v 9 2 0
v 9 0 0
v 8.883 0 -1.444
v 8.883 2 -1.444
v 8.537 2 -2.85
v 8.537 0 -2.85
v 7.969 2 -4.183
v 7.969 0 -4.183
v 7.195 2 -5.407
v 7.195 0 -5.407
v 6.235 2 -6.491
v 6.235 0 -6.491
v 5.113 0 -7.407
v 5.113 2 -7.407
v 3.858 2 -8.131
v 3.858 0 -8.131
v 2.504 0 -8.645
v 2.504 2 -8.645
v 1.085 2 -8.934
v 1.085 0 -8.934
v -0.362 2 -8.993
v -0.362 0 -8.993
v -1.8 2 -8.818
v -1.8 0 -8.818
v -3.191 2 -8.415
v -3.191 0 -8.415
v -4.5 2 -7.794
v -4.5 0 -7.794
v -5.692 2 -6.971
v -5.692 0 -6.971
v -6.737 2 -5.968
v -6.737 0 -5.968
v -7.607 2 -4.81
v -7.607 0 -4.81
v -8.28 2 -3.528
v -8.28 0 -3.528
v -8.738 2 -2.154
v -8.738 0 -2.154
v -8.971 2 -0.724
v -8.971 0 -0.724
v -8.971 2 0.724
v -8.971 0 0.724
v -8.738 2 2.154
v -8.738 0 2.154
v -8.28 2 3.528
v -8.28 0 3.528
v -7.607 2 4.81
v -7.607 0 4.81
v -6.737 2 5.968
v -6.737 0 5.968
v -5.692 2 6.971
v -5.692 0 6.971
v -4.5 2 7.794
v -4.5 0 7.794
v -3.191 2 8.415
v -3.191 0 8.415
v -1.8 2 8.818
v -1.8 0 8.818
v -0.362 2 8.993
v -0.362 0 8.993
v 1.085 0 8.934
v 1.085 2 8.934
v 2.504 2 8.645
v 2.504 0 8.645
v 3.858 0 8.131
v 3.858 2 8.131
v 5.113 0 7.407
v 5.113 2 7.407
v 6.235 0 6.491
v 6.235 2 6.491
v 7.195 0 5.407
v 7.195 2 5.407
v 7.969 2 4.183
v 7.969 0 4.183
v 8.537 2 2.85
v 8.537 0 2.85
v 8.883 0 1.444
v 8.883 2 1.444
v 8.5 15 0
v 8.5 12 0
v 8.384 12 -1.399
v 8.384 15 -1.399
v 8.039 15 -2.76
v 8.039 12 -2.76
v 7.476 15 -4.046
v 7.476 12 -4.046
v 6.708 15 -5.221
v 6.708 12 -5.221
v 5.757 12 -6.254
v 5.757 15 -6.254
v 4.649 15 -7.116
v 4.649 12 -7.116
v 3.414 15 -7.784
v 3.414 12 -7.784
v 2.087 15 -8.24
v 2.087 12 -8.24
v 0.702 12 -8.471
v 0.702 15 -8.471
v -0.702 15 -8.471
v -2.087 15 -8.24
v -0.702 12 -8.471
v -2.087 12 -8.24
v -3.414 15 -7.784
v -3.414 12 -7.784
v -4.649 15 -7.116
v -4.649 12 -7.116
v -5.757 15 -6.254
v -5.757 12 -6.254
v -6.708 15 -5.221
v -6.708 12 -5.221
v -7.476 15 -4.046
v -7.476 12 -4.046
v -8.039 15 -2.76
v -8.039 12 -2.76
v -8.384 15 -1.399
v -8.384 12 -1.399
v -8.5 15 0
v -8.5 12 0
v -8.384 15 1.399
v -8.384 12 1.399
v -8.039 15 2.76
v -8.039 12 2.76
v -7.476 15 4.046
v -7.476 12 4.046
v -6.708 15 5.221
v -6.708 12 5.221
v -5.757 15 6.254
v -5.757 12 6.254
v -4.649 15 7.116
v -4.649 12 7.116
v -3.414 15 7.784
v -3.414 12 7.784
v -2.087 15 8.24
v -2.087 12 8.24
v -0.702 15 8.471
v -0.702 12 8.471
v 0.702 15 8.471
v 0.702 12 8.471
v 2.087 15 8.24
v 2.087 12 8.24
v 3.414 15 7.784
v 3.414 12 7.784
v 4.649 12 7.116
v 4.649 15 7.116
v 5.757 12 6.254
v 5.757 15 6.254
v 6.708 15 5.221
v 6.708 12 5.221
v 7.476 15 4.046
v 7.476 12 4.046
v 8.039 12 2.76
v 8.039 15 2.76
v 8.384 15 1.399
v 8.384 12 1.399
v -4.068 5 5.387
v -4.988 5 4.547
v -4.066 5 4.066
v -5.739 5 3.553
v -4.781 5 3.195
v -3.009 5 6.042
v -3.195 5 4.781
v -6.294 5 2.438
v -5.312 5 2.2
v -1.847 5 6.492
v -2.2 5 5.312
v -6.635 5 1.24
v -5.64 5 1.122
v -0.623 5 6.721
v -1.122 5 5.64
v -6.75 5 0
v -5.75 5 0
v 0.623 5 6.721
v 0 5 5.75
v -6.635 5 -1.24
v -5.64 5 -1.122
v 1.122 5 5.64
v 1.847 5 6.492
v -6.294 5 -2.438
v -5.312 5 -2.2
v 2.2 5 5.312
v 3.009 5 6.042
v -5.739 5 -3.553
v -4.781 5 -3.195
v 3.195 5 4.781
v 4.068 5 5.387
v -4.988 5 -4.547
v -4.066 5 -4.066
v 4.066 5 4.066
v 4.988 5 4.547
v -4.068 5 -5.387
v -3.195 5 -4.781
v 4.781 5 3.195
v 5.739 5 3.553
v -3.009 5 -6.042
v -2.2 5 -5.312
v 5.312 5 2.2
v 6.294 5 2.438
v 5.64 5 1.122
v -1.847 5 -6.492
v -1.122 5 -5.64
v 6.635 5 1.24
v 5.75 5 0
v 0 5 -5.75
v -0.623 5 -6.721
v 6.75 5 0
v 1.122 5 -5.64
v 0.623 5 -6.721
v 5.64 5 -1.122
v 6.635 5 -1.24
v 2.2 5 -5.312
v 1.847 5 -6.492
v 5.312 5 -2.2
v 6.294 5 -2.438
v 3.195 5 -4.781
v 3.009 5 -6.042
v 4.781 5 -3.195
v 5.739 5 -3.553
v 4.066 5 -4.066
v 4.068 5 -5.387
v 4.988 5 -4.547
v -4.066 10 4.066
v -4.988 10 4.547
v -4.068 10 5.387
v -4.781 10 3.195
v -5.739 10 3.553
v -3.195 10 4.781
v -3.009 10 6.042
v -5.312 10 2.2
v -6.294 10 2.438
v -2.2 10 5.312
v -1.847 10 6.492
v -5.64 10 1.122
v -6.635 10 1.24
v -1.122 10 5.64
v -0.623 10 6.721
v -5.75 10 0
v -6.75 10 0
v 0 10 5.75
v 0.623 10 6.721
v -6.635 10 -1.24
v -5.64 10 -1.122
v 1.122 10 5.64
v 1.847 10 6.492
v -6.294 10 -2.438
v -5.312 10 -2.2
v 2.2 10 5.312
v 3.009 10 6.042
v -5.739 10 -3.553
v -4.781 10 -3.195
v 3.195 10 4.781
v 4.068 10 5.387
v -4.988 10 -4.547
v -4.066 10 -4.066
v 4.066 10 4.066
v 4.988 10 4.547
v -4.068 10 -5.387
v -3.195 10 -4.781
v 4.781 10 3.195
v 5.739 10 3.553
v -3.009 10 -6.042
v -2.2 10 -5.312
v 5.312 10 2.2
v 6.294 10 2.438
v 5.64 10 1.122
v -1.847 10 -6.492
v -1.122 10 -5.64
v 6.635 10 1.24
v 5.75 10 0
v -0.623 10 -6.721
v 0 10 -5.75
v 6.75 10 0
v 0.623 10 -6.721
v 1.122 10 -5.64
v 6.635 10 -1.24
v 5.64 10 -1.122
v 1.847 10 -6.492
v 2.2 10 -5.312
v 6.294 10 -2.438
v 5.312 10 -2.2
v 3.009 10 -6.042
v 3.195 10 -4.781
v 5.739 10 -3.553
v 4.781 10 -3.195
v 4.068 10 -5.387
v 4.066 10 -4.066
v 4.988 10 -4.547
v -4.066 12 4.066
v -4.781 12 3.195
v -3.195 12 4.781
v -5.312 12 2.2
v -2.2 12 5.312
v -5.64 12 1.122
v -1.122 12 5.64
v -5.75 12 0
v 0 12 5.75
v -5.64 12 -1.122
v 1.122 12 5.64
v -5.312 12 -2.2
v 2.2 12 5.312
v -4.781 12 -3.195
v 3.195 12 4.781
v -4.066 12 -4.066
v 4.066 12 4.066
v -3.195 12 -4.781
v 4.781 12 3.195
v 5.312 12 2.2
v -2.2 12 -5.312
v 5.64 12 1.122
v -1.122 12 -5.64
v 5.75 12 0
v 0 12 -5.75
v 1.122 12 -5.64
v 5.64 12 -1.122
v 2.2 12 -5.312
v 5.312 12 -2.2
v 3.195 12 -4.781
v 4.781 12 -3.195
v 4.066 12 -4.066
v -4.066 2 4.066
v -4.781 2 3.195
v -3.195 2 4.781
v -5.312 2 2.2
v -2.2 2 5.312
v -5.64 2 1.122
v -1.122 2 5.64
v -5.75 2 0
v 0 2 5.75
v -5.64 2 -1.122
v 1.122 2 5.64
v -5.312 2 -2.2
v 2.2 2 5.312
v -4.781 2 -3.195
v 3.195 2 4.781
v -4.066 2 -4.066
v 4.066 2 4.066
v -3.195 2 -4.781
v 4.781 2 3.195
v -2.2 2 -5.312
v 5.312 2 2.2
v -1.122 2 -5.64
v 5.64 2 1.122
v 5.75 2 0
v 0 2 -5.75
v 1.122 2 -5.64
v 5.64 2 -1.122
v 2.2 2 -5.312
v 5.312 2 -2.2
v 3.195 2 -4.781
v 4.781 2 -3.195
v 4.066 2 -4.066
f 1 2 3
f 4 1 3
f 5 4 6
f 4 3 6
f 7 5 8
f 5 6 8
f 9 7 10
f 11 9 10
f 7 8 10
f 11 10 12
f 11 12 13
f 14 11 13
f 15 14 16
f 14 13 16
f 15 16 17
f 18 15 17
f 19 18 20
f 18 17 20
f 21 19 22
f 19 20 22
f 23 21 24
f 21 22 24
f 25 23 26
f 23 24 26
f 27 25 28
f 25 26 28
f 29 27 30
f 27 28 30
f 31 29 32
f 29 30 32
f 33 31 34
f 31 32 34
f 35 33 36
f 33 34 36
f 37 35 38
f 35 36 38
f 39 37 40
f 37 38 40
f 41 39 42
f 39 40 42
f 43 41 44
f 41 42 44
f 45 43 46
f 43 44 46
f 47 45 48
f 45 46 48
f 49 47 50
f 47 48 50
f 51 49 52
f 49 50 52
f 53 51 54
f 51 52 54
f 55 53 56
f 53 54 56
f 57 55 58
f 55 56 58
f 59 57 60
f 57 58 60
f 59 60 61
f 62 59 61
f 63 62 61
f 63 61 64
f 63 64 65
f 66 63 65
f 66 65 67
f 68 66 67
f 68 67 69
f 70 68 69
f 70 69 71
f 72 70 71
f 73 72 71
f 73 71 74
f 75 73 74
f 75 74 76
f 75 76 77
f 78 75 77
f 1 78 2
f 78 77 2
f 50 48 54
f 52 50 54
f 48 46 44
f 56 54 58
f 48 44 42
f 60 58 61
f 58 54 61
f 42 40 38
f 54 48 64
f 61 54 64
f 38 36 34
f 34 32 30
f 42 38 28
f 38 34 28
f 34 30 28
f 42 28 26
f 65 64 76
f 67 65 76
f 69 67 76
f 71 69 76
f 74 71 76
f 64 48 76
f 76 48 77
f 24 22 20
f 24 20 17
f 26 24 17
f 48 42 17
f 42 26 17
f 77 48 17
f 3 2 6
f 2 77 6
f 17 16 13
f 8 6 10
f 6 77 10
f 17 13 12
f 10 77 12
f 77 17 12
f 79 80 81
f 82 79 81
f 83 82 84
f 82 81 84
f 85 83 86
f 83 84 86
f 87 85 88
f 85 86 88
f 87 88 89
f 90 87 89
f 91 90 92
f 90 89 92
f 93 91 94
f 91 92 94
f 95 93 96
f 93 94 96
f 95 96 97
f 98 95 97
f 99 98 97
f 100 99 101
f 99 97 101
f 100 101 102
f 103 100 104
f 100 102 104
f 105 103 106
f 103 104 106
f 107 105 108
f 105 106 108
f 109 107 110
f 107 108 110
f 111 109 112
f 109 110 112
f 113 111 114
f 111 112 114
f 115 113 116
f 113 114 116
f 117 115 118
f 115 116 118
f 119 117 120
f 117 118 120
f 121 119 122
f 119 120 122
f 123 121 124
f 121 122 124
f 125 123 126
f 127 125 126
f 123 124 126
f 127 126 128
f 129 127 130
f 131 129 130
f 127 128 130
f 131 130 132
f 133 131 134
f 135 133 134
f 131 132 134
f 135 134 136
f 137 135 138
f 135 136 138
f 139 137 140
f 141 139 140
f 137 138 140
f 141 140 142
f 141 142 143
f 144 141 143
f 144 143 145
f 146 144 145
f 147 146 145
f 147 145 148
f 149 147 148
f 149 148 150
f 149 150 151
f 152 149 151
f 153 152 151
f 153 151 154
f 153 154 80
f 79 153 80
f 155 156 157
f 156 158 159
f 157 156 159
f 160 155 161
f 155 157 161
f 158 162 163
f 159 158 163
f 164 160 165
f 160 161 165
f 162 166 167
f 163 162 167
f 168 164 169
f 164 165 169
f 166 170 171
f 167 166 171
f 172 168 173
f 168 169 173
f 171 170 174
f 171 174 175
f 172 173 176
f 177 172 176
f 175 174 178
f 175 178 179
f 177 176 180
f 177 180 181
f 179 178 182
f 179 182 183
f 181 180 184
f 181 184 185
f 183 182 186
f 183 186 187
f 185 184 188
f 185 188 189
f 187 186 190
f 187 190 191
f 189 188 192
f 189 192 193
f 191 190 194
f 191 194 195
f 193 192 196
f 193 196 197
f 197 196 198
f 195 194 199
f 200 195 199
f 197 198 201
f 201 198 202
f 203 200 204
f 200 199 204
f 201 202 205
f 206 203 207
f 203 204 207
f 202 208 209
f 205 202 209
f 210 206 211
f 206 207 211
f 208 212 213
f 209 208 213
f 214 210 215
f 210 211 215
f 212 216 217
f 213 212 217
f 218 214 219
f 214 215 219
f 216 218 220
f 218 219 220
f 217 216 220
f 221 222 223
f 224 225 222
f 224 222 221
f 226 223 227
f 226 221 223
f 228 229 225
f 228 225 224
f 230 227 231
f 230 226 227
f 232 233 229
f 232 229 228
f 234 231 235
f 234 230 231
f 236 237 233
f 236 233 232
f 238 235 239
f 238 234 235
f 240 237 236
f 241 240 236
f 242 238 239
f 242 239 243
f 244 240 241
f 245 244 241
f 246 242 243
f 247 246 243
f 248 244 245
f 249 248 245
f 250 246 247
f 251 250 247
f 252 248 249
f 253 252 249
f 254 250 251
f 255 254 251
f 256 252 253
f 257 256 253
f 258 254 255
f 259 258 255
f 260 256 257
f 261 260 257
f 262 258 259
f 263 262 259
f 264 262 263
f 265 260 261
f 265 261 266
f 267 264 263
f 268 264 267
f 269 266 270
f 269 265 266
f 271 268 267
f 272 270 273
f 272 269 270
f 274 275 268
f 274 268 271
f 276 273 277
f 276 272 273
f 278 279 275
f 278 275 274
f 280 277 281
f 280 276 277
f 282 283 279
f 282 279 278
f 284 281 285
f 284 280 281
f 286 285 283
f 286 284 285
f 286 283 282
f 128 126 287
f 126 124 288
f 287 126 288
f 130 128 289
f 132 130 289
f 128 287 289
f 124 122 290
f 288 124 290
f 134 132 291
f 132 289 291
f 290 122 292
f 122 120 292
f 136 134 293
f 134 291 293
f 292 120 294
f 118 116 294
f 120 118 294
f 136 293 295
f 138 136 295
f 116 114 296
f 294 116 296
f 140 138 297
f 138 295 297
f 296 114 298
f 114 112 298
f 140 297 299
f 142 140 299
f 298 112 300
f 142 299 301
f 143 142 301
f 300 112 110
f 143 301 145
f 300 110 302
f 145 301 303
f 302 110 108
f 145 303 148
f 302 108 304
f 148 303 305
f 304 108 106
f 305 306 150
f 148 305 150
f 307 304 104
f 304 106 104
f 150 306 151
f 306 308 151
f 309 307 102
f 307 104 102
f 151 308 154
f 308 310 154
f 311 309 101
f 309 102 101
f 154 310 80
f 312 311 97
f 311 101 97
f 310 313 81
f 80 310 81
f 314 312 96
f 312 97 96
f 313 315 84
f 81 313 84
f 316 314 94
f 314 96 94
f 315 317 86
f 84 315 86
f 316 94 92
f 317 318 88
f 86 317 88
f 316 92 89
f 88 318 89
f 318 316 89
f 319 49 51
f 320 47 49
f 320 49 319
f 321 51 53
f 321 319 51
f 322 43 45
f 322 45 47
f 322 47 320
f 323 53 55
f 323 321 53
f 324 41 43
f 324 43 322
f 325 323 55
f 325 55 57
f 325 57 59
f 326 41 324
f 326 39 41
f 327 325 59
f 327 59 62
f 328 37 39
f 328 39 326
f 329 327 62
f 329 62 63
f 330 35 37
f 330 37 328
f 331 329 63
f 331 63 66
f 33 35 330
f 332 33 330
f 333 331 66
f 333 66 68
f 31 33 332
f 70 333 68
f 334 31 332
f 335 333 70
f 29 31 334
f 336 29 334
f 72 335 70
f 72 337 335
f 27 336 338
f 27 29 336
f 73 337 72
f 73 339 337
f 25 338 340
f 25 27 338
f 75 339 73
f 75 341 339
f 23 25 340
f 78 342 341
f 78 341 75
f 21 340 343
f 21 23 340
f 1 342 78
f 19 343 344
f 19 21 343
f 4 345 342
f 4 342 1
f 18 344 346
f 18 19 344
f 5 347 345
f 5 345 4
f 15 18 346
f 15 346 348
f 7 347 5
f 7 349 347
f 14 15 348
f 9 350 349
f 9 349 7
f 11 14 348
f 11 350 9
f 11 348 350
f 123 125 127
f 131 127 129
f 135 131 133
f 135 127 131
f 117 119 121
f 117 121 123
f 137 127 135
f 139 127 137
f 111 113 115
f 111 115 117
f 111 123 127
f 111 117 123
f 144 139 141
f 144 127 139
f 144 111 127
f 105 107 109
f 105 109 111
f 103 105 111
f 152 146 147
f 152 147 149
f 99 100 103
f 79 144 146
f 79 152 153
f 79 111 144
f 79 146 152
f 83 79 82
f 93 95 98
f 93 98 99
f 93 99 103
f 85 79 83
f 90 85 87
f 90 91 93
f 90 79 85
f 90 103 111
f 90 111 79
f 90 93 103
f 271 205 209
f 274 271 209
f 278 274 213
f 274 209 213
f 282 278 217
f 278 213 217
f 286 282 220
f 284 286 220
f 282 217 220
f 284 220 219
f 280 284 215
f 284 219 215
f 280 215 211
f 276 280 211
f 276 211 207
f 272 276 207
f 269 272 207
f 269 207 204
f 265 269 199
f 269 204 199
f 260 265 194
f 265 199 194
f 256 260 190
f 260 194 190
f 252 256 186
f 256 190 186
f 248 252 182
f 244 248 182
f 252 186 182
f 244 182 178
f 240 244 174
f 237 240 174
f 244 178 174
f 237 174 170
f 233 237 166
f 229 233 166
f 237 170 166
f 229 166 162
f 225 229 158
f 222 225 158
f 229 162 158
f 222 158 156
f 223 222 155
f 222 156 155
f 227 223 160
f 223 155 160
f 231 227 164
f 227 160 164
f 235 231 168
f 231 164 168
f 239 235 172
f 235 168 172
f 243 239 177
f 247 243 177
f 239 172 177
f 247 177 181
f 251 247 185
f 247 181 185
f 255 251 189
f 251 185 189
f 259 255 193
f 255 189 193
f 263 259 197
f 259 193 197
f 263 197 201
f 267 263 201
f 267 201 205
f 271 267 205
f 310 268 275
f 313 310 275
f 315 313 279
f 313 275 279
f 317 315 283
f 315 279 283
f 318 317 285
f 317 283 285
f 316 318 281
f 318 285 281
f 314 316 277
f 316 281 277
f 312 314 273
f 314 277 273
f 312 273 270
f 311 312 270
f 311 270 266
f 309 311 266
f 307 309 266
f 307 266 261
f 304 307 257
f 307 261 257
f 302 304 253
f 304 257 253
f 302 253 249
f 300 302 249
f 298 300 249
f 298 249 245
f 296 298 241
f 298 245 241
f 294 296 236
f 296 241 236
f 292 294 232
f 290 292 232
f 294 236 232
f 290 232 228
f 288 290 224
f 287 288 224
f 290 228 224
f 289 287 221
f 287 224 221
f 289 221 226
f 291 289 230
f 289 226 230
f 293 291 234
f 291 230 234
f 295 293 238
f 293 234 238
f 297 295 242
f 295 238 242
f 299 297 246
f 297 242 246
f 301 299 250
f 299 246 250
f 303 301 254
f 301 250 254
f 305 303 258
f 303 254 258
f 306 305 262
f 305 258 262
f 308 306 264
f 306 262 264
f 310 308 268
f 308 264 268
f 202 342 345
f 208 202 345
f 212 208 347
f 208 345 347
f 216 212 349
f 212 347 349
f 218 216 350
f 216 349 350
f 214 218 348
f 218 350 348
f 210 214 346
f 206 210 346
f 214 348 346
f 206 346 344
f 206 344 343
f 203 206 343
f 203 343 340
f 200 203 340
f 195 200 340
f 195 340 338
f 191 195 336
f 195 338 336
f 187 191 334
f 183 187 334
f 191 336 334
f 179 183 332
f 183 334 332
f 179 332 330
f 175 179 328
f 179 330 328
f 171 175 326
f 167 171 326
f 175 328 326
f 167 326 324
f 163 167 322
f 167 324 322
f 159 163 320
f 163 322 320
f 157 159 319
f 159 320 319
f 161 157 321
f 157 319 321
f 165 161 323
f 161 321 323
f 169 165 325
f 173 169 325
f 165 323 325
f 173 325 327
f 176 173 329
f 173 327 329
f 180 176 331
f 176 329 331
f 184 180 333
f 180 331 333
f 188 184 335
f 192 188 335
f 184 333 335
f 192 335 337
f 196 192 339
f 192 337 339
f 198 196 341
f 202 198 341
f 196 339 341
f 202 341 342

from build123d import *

# Parameters (mm, degrees)
SKETCH1_R           = 9
BOSS_EXTRUDE1_DEPTH = 2
SKETCH2_R           = 5.75
BOSS_EXTRUDE2_DEPTH = 3
SKETCH3_R           = 6.75
BOSS_EXTRUDE3_DEPTH = 5
SKETCH4_R           = 5.75
BOSS_EXTRUDE4_DEPTH = 2
SKETCH5_R           = 8.5
BOSS_EXTRUDE5_DEPTH = 3


with BuildPart() as part:
    # Sketch1 → Boss-Extrude1 (new body)
    with BuildSketch(Plane(origin=(0, 0, 0), x_dir=(1, 0, 0), z_dir=(0, 1, 0))):
        Circle(SKETCH1_R)
    extrude(amount=BOSS_EXTRUDE1_DEPTH)

    # Sketch2 → Boss-Extrude2 (add)
    with BuildSketch(Plane(origin=(0, 2, 0), x_dir=(1, 0, 0), z_dir=(0, 1, 0))):
        Circle(SKETCH2_R)
    extrude(amount=BOSS_EXTRUDE2_DEPTH)

    # Sketch3 → Boss-Extrude3 (add)
    with BuildSketch(Plane(origin=(0, 5, 0), x_dir=(1, 0, 0), z_dir=(0, 1, 0))):
        Circle(SKETCH3_R)
    extrude(amount=BOSS_EXTRUDE3_DEPTH)

    # Sketch4 → Boss-Extrude4 (add)
    with BuildSketch(Plane(origin=(0, 10, 0), x_dir=(1, 0, 0), z_dir=(0, 1, 0))):
        Circle(SKETCH4_R)
    extrude(amount=BOSS_EXTRUDE4_DEPTH)

    # Sketch5 → Boss-Extrude5 (add)
    with BuildSketch(Plane(origin=(0, 12, 0), x_dir=(1, 0, 0), z_dir=(0, 1, 0))):
        Circle(SKETCH5_R)
    extrude(amount=BOSS_EXTRUDE5_DEPTH)


solid = part.part
